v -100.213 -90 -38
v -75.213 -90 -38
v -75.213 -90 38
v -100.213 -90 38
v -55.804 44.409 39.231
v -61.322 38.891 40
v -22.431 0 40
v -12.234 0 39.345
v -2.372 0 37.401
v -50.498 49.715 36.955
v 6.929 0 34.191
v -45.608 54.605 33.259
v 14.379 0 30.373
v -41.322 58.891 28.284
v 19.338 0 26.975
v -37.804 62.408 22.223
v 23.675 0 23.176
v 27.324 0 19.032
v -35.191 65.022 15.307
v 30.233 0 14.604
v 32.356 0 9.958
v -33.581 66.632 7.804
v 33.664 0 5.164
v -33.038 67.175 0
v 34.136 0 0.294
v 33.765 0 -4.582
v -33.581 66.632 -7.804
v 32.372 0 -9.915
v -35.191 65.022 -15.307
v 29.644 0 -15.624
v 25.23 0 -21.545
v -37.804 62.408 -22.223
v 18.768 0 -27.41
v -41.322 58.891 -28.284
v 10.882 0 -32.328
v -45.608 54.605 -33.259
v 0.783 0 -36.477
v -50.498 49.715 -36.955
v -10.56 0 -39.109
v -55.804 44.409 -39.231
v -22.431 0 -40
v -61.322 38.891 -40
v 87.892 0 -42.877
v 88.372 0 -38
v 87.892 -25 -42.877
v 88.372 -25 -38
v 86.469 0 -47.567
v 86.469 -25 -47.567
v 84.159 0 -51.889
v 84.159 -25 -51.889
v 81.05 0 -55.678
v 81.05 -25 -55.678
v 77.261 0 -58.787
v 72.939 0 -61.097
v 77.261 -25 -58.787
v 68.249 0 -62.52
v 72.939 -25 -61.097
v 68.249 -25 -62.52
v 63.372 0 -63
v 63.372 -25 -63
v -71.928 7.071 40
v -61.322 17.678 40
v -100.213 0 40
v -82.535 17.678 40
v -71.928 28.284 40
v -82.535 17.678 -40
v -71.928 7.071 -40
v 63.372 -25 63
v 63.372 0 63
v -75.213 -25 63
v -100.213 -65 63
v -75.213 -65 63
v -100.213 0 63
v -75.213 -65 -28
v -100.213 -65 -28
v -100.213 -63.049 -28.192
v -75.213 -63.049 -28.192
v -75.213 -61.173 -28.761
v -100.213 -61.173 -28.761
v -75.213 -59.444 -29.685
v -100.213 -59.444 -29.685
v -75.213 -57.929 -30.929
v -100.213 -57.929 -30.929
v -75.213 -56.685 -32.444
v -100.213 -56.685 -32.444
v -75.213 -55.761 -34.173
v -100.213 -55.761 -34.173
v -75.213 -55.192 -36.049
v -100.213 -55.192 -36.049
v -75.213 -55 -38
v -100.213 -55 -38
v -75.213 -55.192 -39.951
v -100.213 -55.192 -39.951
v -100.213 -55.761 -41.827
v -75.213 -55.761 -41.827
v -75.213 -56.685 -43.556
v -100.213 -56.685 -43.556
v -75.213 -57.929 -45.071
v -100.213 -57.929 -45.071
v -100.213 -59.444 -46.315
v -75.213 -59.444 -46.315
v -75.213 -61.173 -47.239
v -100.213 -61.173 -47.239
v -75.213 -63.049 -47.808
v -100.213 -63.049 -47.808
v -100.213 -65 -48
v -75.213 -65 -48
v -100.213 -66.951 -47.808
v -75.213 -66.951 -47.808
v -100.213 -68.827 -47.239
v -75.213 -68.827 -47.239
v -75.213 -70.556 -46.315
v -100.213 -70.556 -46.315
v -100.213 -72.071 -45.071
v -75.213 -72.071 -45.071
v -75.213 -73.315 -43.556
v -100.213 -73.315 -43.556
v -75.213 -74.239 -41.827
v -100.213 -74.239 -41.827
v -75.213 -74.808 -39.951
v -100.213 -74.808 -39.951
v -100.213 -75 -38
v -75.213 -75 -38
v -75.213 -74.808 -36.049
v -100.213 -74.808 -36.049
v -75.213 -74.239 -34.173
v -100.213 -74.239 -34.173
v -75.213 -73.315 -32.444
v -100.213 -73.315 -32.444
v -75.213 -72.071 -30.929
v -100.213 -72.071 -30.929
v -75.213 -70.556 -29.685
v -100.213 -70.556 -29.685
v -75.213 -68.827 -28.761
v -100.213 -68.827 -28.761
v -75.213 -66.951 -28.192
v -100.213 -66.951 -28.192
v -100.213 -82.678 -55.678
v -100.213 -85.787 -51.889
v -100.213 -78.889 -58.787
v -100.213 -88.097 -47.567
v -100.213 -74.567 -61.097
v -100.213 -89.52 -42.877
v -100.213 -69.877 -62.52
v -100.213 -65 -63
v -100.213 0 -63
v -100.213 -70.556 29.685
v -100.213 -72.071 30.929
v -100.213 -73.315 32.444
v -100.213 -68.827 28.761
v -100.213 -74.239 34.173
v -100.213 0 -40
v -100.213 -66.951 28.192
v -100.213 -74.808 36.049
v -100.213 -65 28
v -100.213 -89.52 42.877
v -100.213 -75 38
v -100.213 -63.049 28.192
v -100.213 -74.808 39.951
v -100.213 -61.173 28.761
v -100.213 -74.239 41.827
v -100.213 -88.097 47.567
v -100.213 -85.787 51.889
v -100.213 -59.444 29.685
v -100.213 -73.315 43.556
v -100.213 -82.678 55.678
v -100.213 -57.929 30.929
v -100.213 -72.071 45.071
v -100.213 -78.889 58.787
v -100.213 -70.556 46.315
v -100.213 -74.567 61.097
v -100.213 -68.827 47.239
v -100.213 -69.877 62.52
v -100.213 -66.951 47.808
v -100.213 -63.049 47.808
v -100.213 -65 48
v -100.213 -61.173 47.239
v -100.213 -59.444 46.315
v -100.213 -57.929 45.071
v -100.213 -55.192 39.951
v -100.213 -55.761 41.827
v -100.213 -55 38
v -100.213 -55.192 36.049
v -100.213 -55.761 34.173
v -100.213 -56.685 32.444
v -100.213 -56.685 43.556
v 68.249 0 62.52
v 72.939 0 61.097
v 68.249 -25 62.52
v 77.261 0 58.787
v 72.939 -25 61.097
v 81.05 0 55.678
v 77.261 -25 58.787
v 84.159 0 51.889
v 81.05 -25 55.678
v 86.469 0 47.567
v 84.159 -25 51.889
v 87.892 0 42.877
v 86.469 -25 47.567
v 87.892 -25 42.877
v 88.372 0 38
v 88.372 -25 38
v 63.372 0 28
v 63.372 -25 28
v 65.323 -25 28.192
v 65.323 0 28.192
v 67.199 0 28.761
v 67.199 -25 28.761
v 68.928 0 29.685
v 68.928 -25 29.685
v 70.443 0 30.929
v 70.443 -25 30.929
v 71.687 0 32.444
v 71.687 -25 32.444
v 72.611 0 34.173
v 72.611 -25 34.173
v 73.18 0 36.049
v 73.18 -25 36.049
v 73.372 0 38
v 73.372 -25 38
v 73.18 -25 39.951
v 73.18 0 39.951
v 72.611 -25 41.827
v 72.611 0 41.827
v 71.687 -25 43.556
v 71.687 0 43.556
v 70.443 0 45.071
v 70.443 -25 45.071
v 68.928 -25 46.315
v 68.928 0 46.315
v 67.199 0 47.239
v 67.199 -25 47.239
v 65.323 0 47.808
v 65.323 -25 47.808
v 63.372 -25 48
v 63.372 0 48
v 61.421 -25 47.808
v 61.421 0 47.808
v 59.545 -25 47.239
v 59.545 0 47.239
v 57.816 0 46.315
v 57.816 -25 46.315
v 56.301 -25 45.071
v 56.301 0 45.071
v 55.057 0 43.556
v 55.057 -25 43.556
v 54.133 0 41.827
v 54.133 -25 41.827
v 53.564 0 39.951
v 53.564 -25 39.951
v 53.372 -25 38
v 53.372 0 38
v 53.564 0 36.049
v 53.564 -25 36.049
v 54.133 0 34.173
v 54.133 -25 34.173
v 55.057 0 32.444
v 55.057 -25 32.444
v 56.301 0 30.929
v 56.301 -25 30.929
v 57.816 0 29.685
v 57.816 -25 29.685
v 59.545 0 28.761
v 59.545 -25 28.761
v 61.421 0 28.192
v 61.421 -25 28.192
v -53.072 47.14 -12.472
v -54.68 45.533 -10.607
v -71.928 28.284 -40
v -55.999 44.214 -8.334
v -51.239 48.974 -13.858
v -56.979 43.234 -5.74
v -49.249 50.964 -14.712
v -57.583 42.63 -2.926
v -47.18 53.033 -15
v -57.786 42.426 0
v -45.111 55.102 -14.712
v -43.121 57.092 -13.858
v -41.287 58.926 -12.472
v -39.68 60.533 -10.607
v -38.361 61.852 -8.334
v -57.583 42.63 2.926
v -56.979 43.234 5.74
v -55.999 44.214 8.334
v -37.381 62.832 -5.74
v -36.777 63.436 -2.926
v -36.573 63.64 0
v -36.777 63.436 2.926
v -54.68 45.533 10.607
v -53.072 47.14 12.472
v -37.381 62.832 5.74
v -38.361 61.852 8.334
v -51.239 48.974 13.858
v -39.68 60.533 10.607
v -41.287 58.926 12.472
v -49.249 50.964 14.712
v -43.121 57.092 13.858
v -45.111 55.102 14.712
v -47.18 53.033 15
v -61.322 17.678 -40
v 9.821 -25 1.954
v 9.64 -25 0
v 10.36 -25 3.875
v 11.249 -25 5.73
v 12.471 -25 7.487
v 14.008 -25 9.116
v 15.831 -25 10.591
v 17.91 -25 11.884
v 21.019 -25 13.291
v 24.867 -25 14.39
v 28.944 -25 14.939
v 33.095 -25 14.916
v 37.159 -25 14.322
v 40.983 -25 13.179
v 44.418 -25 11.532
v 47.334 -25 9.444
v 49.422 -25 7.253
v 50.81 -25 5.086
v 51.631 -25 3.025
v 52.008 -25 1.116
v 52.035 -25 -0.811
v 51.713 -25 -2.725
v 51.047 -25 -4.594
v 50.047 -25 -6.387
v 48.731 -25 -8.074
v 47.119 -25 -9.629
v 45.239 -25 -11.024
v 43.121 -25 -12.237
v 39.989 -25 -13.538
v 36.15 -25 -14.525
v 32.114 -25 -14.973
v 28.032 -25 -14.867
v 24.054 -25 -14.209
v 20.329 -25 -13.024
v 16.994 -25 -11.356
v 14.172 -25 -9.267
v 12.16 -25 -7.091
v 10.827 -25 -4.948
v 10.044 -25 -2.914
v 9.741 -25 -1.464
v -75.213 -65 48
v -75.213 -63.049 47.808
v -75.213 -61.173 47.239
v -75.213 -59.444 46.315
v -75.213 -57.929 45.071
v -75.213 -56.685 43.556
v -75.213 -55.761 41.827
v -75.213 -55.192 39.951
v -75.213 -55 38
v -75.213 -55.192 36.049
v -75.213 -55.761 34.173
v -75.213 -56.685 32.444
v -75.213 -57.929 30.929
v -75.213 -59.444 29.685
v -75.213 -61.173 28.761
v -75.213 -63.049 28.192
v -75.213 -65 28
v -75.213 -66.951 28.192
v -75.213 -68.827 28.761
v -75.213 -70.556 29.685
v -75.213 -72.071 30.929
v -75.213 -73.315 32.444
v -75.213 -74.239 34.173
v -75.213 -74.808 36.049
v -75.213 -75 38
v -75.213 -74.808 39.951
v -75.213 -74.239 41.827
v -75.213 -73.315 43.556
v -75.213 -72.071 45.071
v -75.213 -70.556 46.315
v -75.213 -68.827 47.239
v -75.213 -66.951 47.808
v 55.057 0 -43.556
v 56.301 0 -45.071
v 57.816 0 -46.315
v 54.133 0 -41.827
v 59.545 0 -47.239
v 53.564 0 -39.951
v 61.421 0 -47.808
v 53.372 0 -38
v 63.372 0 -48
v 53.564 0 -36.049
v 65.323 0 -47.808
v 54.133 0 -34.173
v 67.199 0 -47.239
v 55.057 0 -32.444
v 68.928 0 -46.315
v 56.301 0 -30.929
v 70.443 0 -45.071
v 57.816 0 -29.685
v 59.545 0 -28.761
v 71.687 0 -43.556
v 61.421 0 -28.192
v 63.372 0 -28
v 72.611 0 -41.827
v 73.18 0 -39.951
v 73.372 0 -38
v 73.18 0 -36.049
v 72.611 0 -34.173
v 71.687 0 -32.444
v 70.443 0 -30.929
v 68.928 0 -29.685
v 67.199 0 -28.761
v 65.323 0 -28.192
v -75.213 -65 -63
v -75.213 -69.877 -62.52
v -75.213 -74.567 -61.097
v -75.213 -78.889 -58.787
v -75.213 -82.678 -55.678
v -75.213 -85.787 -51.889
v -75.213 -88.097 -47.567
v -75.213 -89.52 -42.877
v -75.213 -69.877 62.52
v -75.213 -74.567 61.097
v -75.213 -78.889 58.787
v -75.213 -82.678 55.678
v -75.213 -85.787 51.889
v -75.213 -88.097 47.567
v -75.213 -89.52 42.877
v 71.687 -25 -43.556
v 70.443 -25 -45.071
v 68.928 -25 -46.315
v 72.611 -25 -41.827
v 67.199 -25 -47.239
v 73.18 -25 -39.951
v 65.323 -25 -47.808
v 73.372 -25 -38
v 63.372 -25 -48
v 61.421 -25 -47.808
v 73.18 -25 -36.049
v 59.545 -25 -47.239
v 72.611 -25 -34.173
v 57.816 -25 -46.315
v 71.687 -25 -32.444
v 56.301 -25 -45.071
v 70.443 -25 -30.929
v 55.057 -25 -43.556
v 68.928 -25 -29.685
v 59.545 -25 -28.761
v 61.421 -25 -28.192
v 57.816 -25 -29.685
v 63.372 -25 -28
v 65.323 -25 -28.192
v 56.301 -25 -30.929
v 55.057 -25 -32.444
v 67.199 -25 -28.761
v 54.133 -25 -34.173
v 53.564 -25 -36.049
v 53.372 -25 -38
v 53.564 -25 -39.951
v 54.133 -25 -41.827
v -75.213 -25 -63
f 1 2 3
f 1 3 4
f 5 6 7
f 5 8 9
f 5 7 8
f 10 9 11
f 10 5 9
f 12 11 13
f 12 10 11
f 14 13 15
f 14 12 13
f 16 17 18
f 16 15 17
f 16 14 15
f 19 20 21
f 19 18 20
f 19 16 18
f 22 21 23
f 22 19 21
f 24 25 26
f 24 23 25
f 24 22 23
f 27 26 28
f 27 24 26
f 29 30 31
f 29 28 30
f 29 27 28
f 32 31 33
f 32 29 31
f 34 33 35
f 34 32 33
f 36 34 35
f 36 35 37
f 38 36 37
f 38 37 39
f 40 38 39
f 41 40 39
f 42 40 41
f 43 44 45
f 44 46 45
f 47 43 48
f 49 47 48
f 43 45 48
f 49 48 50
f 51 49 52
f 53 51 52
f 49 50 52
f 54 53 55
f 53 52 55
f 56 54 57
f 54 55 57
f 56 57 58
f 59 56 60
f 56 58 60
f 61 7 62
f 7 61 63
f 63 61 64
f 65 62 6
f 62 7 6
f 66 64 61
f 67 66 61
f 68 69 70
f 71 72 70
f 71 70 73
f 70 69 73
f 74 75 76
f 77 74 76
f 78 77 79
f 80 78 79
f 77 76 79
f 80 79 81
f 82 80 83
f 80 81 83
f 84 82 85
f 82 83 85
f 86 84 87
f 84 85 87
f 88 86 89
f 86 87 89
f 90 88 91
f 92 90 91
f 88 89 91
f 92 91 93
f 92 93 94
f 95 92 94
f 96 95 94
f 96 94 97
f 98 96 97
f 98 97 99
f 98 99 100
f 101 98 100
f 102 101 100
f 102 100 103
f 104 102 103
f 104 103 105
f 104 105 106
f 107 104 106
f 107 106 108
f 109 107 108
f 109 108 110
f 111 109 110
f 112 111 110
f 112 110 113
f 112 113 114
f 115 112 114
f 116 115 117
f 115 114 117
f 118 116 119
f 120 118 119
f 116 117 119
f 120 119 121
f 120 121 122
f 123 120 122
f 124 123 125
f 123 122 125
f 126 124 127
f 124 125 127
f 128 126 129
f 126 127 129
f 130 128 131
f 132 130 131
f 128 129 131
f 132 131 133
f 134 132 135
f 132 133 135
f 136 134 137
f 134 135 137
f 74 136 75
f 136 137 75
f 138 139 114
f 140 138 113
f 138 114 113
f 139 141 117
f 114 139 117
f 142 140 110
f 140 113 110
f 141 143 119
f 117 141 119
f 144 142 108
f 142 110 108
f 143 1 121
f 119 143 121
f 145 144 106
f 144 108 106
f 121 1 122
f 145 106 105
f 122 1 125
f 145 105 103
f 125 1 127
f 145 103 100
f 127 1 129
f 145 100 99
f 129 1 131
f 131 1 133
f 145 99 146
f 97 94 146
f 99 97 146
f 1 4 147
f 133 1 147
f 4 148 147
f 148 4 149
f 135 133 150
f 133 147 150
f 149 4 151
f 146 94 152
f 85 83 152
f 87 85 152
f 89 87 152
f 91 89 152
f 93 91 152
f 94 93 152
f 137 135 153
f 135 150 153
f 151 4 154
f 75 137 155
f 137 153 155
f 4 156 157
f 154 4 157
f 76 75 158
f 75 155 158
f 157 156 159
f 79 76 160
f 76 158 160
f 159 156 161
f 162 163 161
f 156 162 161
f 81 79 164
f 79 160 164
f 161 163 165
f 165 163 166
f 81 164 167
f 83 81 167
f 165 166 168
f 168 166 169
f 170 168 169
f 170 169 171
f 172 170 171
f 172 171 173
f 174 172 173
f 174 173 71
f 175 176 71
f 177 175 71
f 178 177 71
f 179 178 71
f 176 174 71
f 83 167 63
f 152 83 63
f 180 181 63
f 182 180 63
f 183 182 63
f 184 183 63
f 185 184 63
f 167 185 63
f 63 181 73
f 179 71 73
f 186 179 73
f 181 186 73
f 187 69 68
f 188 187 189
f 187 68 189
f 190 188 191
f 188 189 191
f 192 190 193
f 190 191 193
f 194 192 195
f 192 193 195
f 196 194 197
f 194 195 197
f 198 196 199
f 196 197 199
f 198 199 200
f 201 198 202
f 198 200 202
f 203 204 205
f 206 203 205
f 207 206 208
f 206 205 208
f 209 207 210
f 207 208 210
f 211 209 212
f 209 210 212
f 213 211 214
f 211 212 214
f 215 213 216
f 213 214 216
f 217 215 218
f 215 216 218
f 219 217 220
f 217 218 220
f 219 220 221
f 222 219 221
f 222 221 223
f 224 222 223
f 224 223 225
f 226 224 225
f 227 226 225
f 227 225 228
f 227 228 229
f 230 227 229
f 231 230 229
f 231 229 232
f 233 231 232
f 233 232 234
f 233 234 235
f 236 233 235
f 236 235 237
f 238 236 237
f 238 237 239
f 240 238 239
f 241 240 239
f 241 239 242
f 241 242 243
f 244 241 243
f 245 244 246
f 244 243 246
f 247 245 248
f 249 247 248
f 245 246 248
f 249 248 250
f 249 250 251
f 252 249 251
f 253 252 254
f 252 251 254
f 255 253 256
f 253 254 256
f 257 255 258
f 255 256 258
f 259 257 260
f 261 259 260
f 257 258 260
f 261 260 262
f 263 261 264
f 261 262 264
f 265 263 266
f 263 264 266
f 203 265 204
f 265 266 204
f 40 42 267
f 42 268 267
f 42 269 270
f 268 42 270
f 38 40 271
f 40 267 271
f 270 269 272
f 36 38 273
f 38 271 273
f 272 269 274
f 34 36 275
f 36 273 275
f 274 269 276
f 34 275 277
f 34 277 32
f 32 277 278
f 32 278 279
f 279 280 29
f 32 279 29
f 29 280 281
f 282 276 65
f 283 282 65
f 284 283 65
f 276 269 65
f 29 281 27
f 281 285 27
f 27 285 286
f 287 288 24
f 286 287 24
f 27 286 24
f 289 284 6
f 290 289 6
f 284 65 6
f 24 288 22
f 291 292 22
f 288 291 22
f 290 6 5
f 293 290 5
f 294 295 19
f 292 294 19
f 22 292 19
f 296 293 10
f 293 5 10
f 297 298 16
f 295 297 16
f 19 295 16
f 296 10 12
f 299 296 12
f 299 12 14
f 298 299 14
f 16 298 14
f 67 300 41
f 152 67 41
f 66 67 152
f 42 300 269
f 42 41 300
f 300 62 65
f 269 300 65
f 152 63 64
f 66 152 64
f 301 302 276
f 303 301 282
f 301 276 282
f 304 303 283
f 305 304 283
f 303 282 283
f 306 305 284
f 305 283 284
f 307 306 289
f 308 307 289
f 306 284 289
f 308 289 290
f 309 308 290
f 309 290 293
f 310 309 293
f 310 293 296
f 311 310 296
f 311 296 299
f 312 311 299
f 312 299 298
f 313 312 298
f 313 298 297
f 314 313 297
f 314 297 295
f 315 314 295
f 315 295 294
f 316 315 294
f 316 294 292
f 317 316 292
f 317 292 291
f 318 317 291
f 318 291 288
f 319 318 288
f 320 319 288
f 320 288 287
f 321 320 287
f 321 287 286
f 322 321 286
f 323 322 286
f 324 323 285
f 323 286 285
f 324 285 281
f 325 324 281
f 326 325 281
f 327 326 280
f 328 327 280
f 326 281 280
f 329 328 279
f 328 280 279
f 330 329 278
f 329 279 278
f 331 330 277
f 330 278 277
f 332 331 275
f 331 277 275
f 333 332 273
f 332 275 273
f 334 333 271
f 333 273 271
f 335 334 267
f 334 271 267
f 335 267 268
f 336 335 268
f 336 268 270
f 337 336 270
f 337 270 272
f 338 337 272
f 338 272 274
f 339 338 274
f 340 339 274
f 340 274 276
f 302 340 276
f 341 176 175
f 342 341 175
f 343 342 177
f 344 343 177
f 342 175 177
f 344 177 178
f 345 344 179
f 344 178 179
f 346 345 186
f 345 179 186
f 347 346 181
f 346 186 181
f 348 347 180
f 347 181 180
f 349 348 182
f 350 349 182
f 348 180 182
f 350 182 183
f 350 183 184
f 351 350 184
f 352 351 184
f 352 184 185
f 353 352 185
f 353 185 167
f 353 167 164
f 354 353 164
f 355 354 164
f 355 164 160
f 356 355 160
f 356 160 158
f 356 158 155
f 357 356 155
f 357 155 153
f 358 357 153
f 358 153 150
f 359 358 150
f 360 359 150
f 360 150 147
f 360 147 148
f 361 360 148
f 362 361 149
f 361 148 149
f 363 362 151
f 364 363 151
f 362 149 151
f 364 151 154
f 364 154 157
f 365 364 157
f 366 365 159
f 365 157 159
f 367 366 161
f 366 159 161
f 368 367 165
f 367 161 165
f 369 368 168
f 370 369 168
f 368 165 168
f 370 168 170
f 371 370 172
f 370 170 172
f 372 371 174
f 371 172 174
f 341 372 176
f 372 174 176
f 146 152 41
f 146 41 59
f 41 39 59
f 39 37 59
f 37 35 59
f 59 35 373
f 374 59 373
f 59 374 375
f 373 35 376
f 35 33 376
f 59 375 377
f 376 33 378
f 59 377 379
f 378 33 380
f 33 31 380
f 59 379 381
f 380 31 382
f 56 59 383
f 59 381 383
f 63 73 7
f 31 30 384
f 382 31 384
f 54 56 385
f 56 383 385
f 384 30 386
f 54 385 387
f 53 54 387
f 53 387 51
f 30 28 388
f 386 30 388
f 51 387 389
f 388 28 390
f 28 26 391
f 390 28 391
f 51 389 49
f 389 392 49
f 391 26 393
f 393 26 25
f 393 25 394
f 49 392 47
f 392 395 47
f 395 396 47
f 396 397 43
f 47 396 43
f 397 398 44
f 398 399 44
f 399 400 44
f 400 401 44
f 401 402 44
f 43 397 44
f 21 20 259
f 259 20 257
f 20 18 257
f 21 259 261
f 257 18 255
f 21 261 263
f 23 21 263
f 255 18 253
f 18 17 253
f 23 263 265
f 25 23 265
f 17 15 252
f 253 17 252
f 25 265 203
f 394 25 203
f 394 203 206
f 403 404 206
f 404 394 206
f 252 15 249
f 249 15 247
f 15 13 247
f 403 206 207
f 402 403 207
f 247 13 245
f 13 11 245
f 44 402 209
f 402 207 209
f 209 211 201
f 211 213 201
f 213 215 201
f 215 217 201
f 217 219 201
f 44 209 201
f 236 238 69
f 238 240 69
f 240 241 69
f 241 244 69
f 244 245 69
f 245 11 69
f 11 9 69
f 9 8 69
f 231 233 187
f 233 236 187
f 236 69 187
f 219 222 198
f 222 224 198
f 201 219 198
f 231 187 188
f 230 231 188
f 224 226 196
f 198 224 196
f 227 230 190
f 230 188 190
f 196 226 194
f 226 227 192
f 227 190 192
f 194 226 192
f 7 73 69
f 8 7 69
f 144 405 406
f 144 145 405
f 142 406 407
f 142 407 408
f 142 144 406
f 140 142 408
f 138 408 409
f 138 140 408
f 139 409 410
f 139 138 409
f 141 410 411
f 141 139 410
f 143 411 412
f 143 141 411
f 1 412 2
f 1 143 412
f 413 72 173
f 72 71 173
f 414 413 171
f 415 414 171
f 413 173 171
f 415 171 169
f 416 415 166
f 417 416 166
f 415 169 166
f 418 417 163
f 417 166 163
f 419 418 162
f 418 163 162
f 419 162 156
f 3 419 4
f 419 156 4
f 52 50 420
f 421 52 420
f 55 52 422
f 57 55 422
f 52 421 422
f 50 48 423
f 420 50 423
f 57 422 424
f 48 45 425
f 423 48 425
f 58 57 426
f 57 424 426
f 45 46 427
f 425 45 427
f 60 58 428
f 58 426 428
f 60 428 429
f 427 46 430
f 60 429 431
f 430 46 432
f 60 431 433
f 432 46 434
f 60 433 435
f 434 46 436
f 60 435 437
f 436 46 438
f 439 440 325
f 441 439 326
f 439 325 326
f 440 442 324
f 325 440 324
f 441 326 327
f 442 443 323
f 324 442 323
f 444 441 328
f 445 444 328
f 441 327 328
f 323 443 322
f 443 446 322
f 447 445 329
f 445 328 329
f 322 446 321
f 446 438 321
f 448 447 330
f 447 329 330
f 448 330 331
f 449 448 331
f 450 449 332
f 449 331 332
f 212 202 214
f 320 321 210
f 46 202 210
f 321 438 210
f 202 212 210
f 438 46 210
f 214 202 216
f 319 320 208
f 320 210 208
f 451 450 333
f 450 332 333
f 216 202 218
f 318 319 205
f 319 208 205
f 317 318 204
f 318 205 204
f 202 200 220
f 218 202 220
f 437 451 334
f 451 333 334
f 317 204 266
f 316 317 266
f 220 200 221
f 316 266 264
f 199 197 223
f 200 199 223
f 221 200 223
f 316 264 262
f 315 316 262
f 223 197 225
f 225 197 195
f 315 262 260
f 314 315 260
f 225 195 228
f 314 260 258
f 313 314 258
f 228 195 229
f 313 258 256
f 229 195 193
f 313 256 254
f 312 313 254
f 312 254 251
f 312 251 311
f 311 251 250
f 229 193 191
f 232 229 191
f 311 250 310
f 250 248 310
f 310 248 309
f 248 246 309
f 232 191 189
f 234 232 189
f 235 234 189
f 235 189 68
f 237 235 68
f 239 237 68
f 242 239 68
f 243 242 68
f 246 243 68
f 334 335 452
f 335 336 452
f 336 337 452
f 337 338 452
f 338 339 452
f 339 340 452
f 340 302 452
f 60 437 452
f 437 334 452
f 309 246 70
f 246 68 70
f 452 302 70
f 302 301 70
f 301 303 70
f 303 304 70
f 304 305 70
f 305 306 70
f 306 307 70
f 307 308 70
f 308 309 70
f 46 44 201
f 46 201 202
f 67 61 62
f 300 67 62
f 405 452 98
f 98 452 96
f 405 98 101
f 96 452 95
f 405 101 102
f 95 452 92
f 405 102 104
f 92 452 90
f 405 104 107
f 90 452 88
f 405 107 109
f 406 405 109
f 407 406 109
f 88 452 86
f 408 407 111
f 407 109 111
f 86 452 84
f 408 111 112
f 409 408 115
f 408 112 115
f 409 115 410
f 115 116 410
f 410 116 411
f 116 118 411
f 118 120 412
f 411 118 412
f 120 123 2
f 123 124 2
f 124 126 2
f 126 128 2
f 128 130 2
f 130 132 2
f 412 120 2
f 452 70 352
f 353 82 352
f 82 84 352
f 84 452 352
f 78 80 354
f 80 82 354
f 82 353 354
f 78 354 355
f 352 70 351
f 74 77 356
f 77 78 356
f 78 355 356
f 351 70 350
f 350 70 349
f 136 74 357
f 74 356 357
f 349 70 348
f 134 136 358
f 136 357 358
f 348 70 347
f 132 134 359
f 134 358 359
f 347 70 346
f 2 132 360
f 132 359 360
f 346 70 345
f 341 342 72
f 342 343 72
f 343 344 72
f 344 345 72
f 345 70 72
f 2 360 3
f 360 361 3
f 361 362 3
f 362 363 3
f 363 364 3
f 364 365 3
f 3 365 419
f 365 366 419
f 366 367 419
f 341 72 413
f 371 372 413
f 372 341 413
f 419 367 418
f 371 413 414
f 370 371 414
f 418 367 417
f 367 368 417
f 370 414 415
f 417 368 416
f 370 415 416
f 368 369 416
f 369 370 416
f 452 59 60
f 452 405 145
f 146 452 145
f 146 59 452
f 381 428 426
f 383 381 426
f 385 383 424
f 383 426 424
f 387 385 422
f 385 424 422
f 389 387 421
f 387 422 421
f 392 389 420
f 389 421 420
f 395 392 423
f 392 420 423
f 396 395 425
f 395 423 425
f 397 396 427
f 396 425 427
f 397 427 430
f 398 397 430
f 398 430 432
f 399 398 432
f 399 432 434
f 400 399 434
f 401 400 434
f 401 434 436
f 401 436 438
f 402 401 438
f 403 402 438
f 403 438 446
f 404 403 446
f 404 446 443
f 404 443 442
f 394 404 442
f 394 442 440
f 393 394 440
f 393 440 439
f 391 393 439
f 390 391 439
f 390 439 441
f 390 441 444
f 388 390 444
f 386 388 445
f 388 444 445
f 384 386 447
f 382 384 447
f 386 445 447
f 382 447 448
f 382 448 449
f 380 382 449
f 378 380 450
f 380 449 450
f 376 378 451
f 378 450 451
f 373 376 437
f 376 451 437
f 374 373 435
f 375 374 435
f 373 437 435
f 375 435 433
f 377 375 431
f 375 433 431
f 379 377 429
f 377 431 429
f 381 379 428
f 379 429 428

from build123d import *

# Parameters (mm, degrees)
BOSS_EXTRUDE1_DEPTH = 63
FILLET1_R           = 25
SKETCH2_R           = 10
CUT_EXTRUDE1_DEPTH  = 126
SKETCH3_R           = 10
CUT_EXTRUDE2_DEPTH  = 126
BOSS_EXTRUDE2_DEPTH = 40
BOSS_EXTRUDE6_REACH = 208.821
SKETCH10_R          = 40
SKETCH11_R          = 15
CUT_EXTRUDE11_DEPTH = 207.821386
CUT_EXTRUDE12_DEPTH = 90


with BuildPart() as part:
    # Sketch1 → Boss-Extrude1 (new, symmetric)
    with BuildSketch(Plane.XY):
        Polygon((-100.212766, -90), (-100.212766, 0), (88.372089, 0), (88.372089, -25), (-75.212766, -25), (-75.212766, -90), align=None)
    extrude(amount=BOSS_EXTRUDE1_DEPTH, both=True)

    # Fillet1
    fillet1_edges = [part.edges().sort_by_distance(p)[0] for p in [
        (88.372089, -12.5, 63),
        (-87.712766, -90, 63),
        (88.372089, -12.5, -63),
        (-87.712766, -90, -63),
    ]]
    fillet(fillet1_edges, radius=FILLET1_R)

    # Sketch2 → Cut-Extrude1 (cut)
    with BuildSketch(Plane.XZ.offset(25)):
        with Locations(Location((63.372089, -38, 0), (0, 0, 270))):
            Circle(SKETCH2_R)
        with Locations(Location((63.372089, 38, 0), (0, 0, 270))):
            Circle(SKETCH2_R)
    extrude(amount=-CUT_EXTRUDE1_DEPTH, mode=Mode.SUBTRACT)

    # Sketch3 → Cut-Extrude2 (cut)
    with BuildSketch(Plane.ZY.offset(100.212766)):
        with Locations((-38, -65)):
            Circle(SKETCH3_R)
        with Locations((38, -65)):
            Circle(SKETCH3_R)
    extrude(amount=-CUT_EXTRUDE2_DEPTH, mode=Mode.SUBTRACT)

    # Sketch4 → Boss-Extrude2 (add, symmetric)
    with BuildSketch(Plane.XY):
        Polygon((-100.212766, 0), (-61.321893, 38.890873), (-22.43102, 0), align=None)
    extrude(amount=BOSS_EXTRUDE2_DEPTH, both=True)

    # Boss-Extrude6: up to this plane
    boss_extrude6_end = Plane(origin=(-100.212766, 0, 63), z_dir=(0, -1, 0))
    # Sketch10 → Boss-Extrude6 (add, up to the surface)
    with BuildSketch(Plane(origin=(-50.106383, 50.106383, 0), x_dir=(0, 0, 1), z_dir=(-0.7071067811865438, 0.7071067811865512, 0)), mode=Mode.PRIVATE) as boss_extrude6_sk1:
        with Locations((0, -15.861126)):
            Circle(SKETCH10_R)
    boss_extrude6_tool1 = split(extrude(boss_extrude6_sk1.sketch, amount=-BOSS_EXTRUDE6_REACH, mode=Mode.PRIVATE), bisect_by=boss_extrude6_end, keep=Keep.BOTH, mode=Mode.PRIVATE)
    add(boss_extrude6_tool1.solids().sort_by_distance((-61.321893, 38.890873, 0))[0])

    # Sketch11 → Cut-Extrude11 (cut, through all)
    with BuildSketch(Plane(origin=(-50.106383, 50.106383, 0), x_dir=(0, 0, 1), z_dir=(-0.7071067811865438, 0.7071067811865512, 0))):
        with Locations(Location((0, 4.138874, 0), (0, 0, 270))):
            Circle(SKETCH11_R)
    extrude(amount=-CUT_EXTRUDE11_DEPTH, mode=Mode.SUBTRACT)

    # Sketch12 → Cut-Extrude12 (cut)
    with BuildSketch(Plane.XY.offset(40)):
        Polygon((-82.535096, 17.67767), (-71.928495, 7.071068), (-61.321893, 17.67767), (-71.928495, 28.284271), align=None)
    extrude(amount=-CUT_EXTRUDE12_DEPTH, mode=Mode.SUBTRACT)


solid = part.part
